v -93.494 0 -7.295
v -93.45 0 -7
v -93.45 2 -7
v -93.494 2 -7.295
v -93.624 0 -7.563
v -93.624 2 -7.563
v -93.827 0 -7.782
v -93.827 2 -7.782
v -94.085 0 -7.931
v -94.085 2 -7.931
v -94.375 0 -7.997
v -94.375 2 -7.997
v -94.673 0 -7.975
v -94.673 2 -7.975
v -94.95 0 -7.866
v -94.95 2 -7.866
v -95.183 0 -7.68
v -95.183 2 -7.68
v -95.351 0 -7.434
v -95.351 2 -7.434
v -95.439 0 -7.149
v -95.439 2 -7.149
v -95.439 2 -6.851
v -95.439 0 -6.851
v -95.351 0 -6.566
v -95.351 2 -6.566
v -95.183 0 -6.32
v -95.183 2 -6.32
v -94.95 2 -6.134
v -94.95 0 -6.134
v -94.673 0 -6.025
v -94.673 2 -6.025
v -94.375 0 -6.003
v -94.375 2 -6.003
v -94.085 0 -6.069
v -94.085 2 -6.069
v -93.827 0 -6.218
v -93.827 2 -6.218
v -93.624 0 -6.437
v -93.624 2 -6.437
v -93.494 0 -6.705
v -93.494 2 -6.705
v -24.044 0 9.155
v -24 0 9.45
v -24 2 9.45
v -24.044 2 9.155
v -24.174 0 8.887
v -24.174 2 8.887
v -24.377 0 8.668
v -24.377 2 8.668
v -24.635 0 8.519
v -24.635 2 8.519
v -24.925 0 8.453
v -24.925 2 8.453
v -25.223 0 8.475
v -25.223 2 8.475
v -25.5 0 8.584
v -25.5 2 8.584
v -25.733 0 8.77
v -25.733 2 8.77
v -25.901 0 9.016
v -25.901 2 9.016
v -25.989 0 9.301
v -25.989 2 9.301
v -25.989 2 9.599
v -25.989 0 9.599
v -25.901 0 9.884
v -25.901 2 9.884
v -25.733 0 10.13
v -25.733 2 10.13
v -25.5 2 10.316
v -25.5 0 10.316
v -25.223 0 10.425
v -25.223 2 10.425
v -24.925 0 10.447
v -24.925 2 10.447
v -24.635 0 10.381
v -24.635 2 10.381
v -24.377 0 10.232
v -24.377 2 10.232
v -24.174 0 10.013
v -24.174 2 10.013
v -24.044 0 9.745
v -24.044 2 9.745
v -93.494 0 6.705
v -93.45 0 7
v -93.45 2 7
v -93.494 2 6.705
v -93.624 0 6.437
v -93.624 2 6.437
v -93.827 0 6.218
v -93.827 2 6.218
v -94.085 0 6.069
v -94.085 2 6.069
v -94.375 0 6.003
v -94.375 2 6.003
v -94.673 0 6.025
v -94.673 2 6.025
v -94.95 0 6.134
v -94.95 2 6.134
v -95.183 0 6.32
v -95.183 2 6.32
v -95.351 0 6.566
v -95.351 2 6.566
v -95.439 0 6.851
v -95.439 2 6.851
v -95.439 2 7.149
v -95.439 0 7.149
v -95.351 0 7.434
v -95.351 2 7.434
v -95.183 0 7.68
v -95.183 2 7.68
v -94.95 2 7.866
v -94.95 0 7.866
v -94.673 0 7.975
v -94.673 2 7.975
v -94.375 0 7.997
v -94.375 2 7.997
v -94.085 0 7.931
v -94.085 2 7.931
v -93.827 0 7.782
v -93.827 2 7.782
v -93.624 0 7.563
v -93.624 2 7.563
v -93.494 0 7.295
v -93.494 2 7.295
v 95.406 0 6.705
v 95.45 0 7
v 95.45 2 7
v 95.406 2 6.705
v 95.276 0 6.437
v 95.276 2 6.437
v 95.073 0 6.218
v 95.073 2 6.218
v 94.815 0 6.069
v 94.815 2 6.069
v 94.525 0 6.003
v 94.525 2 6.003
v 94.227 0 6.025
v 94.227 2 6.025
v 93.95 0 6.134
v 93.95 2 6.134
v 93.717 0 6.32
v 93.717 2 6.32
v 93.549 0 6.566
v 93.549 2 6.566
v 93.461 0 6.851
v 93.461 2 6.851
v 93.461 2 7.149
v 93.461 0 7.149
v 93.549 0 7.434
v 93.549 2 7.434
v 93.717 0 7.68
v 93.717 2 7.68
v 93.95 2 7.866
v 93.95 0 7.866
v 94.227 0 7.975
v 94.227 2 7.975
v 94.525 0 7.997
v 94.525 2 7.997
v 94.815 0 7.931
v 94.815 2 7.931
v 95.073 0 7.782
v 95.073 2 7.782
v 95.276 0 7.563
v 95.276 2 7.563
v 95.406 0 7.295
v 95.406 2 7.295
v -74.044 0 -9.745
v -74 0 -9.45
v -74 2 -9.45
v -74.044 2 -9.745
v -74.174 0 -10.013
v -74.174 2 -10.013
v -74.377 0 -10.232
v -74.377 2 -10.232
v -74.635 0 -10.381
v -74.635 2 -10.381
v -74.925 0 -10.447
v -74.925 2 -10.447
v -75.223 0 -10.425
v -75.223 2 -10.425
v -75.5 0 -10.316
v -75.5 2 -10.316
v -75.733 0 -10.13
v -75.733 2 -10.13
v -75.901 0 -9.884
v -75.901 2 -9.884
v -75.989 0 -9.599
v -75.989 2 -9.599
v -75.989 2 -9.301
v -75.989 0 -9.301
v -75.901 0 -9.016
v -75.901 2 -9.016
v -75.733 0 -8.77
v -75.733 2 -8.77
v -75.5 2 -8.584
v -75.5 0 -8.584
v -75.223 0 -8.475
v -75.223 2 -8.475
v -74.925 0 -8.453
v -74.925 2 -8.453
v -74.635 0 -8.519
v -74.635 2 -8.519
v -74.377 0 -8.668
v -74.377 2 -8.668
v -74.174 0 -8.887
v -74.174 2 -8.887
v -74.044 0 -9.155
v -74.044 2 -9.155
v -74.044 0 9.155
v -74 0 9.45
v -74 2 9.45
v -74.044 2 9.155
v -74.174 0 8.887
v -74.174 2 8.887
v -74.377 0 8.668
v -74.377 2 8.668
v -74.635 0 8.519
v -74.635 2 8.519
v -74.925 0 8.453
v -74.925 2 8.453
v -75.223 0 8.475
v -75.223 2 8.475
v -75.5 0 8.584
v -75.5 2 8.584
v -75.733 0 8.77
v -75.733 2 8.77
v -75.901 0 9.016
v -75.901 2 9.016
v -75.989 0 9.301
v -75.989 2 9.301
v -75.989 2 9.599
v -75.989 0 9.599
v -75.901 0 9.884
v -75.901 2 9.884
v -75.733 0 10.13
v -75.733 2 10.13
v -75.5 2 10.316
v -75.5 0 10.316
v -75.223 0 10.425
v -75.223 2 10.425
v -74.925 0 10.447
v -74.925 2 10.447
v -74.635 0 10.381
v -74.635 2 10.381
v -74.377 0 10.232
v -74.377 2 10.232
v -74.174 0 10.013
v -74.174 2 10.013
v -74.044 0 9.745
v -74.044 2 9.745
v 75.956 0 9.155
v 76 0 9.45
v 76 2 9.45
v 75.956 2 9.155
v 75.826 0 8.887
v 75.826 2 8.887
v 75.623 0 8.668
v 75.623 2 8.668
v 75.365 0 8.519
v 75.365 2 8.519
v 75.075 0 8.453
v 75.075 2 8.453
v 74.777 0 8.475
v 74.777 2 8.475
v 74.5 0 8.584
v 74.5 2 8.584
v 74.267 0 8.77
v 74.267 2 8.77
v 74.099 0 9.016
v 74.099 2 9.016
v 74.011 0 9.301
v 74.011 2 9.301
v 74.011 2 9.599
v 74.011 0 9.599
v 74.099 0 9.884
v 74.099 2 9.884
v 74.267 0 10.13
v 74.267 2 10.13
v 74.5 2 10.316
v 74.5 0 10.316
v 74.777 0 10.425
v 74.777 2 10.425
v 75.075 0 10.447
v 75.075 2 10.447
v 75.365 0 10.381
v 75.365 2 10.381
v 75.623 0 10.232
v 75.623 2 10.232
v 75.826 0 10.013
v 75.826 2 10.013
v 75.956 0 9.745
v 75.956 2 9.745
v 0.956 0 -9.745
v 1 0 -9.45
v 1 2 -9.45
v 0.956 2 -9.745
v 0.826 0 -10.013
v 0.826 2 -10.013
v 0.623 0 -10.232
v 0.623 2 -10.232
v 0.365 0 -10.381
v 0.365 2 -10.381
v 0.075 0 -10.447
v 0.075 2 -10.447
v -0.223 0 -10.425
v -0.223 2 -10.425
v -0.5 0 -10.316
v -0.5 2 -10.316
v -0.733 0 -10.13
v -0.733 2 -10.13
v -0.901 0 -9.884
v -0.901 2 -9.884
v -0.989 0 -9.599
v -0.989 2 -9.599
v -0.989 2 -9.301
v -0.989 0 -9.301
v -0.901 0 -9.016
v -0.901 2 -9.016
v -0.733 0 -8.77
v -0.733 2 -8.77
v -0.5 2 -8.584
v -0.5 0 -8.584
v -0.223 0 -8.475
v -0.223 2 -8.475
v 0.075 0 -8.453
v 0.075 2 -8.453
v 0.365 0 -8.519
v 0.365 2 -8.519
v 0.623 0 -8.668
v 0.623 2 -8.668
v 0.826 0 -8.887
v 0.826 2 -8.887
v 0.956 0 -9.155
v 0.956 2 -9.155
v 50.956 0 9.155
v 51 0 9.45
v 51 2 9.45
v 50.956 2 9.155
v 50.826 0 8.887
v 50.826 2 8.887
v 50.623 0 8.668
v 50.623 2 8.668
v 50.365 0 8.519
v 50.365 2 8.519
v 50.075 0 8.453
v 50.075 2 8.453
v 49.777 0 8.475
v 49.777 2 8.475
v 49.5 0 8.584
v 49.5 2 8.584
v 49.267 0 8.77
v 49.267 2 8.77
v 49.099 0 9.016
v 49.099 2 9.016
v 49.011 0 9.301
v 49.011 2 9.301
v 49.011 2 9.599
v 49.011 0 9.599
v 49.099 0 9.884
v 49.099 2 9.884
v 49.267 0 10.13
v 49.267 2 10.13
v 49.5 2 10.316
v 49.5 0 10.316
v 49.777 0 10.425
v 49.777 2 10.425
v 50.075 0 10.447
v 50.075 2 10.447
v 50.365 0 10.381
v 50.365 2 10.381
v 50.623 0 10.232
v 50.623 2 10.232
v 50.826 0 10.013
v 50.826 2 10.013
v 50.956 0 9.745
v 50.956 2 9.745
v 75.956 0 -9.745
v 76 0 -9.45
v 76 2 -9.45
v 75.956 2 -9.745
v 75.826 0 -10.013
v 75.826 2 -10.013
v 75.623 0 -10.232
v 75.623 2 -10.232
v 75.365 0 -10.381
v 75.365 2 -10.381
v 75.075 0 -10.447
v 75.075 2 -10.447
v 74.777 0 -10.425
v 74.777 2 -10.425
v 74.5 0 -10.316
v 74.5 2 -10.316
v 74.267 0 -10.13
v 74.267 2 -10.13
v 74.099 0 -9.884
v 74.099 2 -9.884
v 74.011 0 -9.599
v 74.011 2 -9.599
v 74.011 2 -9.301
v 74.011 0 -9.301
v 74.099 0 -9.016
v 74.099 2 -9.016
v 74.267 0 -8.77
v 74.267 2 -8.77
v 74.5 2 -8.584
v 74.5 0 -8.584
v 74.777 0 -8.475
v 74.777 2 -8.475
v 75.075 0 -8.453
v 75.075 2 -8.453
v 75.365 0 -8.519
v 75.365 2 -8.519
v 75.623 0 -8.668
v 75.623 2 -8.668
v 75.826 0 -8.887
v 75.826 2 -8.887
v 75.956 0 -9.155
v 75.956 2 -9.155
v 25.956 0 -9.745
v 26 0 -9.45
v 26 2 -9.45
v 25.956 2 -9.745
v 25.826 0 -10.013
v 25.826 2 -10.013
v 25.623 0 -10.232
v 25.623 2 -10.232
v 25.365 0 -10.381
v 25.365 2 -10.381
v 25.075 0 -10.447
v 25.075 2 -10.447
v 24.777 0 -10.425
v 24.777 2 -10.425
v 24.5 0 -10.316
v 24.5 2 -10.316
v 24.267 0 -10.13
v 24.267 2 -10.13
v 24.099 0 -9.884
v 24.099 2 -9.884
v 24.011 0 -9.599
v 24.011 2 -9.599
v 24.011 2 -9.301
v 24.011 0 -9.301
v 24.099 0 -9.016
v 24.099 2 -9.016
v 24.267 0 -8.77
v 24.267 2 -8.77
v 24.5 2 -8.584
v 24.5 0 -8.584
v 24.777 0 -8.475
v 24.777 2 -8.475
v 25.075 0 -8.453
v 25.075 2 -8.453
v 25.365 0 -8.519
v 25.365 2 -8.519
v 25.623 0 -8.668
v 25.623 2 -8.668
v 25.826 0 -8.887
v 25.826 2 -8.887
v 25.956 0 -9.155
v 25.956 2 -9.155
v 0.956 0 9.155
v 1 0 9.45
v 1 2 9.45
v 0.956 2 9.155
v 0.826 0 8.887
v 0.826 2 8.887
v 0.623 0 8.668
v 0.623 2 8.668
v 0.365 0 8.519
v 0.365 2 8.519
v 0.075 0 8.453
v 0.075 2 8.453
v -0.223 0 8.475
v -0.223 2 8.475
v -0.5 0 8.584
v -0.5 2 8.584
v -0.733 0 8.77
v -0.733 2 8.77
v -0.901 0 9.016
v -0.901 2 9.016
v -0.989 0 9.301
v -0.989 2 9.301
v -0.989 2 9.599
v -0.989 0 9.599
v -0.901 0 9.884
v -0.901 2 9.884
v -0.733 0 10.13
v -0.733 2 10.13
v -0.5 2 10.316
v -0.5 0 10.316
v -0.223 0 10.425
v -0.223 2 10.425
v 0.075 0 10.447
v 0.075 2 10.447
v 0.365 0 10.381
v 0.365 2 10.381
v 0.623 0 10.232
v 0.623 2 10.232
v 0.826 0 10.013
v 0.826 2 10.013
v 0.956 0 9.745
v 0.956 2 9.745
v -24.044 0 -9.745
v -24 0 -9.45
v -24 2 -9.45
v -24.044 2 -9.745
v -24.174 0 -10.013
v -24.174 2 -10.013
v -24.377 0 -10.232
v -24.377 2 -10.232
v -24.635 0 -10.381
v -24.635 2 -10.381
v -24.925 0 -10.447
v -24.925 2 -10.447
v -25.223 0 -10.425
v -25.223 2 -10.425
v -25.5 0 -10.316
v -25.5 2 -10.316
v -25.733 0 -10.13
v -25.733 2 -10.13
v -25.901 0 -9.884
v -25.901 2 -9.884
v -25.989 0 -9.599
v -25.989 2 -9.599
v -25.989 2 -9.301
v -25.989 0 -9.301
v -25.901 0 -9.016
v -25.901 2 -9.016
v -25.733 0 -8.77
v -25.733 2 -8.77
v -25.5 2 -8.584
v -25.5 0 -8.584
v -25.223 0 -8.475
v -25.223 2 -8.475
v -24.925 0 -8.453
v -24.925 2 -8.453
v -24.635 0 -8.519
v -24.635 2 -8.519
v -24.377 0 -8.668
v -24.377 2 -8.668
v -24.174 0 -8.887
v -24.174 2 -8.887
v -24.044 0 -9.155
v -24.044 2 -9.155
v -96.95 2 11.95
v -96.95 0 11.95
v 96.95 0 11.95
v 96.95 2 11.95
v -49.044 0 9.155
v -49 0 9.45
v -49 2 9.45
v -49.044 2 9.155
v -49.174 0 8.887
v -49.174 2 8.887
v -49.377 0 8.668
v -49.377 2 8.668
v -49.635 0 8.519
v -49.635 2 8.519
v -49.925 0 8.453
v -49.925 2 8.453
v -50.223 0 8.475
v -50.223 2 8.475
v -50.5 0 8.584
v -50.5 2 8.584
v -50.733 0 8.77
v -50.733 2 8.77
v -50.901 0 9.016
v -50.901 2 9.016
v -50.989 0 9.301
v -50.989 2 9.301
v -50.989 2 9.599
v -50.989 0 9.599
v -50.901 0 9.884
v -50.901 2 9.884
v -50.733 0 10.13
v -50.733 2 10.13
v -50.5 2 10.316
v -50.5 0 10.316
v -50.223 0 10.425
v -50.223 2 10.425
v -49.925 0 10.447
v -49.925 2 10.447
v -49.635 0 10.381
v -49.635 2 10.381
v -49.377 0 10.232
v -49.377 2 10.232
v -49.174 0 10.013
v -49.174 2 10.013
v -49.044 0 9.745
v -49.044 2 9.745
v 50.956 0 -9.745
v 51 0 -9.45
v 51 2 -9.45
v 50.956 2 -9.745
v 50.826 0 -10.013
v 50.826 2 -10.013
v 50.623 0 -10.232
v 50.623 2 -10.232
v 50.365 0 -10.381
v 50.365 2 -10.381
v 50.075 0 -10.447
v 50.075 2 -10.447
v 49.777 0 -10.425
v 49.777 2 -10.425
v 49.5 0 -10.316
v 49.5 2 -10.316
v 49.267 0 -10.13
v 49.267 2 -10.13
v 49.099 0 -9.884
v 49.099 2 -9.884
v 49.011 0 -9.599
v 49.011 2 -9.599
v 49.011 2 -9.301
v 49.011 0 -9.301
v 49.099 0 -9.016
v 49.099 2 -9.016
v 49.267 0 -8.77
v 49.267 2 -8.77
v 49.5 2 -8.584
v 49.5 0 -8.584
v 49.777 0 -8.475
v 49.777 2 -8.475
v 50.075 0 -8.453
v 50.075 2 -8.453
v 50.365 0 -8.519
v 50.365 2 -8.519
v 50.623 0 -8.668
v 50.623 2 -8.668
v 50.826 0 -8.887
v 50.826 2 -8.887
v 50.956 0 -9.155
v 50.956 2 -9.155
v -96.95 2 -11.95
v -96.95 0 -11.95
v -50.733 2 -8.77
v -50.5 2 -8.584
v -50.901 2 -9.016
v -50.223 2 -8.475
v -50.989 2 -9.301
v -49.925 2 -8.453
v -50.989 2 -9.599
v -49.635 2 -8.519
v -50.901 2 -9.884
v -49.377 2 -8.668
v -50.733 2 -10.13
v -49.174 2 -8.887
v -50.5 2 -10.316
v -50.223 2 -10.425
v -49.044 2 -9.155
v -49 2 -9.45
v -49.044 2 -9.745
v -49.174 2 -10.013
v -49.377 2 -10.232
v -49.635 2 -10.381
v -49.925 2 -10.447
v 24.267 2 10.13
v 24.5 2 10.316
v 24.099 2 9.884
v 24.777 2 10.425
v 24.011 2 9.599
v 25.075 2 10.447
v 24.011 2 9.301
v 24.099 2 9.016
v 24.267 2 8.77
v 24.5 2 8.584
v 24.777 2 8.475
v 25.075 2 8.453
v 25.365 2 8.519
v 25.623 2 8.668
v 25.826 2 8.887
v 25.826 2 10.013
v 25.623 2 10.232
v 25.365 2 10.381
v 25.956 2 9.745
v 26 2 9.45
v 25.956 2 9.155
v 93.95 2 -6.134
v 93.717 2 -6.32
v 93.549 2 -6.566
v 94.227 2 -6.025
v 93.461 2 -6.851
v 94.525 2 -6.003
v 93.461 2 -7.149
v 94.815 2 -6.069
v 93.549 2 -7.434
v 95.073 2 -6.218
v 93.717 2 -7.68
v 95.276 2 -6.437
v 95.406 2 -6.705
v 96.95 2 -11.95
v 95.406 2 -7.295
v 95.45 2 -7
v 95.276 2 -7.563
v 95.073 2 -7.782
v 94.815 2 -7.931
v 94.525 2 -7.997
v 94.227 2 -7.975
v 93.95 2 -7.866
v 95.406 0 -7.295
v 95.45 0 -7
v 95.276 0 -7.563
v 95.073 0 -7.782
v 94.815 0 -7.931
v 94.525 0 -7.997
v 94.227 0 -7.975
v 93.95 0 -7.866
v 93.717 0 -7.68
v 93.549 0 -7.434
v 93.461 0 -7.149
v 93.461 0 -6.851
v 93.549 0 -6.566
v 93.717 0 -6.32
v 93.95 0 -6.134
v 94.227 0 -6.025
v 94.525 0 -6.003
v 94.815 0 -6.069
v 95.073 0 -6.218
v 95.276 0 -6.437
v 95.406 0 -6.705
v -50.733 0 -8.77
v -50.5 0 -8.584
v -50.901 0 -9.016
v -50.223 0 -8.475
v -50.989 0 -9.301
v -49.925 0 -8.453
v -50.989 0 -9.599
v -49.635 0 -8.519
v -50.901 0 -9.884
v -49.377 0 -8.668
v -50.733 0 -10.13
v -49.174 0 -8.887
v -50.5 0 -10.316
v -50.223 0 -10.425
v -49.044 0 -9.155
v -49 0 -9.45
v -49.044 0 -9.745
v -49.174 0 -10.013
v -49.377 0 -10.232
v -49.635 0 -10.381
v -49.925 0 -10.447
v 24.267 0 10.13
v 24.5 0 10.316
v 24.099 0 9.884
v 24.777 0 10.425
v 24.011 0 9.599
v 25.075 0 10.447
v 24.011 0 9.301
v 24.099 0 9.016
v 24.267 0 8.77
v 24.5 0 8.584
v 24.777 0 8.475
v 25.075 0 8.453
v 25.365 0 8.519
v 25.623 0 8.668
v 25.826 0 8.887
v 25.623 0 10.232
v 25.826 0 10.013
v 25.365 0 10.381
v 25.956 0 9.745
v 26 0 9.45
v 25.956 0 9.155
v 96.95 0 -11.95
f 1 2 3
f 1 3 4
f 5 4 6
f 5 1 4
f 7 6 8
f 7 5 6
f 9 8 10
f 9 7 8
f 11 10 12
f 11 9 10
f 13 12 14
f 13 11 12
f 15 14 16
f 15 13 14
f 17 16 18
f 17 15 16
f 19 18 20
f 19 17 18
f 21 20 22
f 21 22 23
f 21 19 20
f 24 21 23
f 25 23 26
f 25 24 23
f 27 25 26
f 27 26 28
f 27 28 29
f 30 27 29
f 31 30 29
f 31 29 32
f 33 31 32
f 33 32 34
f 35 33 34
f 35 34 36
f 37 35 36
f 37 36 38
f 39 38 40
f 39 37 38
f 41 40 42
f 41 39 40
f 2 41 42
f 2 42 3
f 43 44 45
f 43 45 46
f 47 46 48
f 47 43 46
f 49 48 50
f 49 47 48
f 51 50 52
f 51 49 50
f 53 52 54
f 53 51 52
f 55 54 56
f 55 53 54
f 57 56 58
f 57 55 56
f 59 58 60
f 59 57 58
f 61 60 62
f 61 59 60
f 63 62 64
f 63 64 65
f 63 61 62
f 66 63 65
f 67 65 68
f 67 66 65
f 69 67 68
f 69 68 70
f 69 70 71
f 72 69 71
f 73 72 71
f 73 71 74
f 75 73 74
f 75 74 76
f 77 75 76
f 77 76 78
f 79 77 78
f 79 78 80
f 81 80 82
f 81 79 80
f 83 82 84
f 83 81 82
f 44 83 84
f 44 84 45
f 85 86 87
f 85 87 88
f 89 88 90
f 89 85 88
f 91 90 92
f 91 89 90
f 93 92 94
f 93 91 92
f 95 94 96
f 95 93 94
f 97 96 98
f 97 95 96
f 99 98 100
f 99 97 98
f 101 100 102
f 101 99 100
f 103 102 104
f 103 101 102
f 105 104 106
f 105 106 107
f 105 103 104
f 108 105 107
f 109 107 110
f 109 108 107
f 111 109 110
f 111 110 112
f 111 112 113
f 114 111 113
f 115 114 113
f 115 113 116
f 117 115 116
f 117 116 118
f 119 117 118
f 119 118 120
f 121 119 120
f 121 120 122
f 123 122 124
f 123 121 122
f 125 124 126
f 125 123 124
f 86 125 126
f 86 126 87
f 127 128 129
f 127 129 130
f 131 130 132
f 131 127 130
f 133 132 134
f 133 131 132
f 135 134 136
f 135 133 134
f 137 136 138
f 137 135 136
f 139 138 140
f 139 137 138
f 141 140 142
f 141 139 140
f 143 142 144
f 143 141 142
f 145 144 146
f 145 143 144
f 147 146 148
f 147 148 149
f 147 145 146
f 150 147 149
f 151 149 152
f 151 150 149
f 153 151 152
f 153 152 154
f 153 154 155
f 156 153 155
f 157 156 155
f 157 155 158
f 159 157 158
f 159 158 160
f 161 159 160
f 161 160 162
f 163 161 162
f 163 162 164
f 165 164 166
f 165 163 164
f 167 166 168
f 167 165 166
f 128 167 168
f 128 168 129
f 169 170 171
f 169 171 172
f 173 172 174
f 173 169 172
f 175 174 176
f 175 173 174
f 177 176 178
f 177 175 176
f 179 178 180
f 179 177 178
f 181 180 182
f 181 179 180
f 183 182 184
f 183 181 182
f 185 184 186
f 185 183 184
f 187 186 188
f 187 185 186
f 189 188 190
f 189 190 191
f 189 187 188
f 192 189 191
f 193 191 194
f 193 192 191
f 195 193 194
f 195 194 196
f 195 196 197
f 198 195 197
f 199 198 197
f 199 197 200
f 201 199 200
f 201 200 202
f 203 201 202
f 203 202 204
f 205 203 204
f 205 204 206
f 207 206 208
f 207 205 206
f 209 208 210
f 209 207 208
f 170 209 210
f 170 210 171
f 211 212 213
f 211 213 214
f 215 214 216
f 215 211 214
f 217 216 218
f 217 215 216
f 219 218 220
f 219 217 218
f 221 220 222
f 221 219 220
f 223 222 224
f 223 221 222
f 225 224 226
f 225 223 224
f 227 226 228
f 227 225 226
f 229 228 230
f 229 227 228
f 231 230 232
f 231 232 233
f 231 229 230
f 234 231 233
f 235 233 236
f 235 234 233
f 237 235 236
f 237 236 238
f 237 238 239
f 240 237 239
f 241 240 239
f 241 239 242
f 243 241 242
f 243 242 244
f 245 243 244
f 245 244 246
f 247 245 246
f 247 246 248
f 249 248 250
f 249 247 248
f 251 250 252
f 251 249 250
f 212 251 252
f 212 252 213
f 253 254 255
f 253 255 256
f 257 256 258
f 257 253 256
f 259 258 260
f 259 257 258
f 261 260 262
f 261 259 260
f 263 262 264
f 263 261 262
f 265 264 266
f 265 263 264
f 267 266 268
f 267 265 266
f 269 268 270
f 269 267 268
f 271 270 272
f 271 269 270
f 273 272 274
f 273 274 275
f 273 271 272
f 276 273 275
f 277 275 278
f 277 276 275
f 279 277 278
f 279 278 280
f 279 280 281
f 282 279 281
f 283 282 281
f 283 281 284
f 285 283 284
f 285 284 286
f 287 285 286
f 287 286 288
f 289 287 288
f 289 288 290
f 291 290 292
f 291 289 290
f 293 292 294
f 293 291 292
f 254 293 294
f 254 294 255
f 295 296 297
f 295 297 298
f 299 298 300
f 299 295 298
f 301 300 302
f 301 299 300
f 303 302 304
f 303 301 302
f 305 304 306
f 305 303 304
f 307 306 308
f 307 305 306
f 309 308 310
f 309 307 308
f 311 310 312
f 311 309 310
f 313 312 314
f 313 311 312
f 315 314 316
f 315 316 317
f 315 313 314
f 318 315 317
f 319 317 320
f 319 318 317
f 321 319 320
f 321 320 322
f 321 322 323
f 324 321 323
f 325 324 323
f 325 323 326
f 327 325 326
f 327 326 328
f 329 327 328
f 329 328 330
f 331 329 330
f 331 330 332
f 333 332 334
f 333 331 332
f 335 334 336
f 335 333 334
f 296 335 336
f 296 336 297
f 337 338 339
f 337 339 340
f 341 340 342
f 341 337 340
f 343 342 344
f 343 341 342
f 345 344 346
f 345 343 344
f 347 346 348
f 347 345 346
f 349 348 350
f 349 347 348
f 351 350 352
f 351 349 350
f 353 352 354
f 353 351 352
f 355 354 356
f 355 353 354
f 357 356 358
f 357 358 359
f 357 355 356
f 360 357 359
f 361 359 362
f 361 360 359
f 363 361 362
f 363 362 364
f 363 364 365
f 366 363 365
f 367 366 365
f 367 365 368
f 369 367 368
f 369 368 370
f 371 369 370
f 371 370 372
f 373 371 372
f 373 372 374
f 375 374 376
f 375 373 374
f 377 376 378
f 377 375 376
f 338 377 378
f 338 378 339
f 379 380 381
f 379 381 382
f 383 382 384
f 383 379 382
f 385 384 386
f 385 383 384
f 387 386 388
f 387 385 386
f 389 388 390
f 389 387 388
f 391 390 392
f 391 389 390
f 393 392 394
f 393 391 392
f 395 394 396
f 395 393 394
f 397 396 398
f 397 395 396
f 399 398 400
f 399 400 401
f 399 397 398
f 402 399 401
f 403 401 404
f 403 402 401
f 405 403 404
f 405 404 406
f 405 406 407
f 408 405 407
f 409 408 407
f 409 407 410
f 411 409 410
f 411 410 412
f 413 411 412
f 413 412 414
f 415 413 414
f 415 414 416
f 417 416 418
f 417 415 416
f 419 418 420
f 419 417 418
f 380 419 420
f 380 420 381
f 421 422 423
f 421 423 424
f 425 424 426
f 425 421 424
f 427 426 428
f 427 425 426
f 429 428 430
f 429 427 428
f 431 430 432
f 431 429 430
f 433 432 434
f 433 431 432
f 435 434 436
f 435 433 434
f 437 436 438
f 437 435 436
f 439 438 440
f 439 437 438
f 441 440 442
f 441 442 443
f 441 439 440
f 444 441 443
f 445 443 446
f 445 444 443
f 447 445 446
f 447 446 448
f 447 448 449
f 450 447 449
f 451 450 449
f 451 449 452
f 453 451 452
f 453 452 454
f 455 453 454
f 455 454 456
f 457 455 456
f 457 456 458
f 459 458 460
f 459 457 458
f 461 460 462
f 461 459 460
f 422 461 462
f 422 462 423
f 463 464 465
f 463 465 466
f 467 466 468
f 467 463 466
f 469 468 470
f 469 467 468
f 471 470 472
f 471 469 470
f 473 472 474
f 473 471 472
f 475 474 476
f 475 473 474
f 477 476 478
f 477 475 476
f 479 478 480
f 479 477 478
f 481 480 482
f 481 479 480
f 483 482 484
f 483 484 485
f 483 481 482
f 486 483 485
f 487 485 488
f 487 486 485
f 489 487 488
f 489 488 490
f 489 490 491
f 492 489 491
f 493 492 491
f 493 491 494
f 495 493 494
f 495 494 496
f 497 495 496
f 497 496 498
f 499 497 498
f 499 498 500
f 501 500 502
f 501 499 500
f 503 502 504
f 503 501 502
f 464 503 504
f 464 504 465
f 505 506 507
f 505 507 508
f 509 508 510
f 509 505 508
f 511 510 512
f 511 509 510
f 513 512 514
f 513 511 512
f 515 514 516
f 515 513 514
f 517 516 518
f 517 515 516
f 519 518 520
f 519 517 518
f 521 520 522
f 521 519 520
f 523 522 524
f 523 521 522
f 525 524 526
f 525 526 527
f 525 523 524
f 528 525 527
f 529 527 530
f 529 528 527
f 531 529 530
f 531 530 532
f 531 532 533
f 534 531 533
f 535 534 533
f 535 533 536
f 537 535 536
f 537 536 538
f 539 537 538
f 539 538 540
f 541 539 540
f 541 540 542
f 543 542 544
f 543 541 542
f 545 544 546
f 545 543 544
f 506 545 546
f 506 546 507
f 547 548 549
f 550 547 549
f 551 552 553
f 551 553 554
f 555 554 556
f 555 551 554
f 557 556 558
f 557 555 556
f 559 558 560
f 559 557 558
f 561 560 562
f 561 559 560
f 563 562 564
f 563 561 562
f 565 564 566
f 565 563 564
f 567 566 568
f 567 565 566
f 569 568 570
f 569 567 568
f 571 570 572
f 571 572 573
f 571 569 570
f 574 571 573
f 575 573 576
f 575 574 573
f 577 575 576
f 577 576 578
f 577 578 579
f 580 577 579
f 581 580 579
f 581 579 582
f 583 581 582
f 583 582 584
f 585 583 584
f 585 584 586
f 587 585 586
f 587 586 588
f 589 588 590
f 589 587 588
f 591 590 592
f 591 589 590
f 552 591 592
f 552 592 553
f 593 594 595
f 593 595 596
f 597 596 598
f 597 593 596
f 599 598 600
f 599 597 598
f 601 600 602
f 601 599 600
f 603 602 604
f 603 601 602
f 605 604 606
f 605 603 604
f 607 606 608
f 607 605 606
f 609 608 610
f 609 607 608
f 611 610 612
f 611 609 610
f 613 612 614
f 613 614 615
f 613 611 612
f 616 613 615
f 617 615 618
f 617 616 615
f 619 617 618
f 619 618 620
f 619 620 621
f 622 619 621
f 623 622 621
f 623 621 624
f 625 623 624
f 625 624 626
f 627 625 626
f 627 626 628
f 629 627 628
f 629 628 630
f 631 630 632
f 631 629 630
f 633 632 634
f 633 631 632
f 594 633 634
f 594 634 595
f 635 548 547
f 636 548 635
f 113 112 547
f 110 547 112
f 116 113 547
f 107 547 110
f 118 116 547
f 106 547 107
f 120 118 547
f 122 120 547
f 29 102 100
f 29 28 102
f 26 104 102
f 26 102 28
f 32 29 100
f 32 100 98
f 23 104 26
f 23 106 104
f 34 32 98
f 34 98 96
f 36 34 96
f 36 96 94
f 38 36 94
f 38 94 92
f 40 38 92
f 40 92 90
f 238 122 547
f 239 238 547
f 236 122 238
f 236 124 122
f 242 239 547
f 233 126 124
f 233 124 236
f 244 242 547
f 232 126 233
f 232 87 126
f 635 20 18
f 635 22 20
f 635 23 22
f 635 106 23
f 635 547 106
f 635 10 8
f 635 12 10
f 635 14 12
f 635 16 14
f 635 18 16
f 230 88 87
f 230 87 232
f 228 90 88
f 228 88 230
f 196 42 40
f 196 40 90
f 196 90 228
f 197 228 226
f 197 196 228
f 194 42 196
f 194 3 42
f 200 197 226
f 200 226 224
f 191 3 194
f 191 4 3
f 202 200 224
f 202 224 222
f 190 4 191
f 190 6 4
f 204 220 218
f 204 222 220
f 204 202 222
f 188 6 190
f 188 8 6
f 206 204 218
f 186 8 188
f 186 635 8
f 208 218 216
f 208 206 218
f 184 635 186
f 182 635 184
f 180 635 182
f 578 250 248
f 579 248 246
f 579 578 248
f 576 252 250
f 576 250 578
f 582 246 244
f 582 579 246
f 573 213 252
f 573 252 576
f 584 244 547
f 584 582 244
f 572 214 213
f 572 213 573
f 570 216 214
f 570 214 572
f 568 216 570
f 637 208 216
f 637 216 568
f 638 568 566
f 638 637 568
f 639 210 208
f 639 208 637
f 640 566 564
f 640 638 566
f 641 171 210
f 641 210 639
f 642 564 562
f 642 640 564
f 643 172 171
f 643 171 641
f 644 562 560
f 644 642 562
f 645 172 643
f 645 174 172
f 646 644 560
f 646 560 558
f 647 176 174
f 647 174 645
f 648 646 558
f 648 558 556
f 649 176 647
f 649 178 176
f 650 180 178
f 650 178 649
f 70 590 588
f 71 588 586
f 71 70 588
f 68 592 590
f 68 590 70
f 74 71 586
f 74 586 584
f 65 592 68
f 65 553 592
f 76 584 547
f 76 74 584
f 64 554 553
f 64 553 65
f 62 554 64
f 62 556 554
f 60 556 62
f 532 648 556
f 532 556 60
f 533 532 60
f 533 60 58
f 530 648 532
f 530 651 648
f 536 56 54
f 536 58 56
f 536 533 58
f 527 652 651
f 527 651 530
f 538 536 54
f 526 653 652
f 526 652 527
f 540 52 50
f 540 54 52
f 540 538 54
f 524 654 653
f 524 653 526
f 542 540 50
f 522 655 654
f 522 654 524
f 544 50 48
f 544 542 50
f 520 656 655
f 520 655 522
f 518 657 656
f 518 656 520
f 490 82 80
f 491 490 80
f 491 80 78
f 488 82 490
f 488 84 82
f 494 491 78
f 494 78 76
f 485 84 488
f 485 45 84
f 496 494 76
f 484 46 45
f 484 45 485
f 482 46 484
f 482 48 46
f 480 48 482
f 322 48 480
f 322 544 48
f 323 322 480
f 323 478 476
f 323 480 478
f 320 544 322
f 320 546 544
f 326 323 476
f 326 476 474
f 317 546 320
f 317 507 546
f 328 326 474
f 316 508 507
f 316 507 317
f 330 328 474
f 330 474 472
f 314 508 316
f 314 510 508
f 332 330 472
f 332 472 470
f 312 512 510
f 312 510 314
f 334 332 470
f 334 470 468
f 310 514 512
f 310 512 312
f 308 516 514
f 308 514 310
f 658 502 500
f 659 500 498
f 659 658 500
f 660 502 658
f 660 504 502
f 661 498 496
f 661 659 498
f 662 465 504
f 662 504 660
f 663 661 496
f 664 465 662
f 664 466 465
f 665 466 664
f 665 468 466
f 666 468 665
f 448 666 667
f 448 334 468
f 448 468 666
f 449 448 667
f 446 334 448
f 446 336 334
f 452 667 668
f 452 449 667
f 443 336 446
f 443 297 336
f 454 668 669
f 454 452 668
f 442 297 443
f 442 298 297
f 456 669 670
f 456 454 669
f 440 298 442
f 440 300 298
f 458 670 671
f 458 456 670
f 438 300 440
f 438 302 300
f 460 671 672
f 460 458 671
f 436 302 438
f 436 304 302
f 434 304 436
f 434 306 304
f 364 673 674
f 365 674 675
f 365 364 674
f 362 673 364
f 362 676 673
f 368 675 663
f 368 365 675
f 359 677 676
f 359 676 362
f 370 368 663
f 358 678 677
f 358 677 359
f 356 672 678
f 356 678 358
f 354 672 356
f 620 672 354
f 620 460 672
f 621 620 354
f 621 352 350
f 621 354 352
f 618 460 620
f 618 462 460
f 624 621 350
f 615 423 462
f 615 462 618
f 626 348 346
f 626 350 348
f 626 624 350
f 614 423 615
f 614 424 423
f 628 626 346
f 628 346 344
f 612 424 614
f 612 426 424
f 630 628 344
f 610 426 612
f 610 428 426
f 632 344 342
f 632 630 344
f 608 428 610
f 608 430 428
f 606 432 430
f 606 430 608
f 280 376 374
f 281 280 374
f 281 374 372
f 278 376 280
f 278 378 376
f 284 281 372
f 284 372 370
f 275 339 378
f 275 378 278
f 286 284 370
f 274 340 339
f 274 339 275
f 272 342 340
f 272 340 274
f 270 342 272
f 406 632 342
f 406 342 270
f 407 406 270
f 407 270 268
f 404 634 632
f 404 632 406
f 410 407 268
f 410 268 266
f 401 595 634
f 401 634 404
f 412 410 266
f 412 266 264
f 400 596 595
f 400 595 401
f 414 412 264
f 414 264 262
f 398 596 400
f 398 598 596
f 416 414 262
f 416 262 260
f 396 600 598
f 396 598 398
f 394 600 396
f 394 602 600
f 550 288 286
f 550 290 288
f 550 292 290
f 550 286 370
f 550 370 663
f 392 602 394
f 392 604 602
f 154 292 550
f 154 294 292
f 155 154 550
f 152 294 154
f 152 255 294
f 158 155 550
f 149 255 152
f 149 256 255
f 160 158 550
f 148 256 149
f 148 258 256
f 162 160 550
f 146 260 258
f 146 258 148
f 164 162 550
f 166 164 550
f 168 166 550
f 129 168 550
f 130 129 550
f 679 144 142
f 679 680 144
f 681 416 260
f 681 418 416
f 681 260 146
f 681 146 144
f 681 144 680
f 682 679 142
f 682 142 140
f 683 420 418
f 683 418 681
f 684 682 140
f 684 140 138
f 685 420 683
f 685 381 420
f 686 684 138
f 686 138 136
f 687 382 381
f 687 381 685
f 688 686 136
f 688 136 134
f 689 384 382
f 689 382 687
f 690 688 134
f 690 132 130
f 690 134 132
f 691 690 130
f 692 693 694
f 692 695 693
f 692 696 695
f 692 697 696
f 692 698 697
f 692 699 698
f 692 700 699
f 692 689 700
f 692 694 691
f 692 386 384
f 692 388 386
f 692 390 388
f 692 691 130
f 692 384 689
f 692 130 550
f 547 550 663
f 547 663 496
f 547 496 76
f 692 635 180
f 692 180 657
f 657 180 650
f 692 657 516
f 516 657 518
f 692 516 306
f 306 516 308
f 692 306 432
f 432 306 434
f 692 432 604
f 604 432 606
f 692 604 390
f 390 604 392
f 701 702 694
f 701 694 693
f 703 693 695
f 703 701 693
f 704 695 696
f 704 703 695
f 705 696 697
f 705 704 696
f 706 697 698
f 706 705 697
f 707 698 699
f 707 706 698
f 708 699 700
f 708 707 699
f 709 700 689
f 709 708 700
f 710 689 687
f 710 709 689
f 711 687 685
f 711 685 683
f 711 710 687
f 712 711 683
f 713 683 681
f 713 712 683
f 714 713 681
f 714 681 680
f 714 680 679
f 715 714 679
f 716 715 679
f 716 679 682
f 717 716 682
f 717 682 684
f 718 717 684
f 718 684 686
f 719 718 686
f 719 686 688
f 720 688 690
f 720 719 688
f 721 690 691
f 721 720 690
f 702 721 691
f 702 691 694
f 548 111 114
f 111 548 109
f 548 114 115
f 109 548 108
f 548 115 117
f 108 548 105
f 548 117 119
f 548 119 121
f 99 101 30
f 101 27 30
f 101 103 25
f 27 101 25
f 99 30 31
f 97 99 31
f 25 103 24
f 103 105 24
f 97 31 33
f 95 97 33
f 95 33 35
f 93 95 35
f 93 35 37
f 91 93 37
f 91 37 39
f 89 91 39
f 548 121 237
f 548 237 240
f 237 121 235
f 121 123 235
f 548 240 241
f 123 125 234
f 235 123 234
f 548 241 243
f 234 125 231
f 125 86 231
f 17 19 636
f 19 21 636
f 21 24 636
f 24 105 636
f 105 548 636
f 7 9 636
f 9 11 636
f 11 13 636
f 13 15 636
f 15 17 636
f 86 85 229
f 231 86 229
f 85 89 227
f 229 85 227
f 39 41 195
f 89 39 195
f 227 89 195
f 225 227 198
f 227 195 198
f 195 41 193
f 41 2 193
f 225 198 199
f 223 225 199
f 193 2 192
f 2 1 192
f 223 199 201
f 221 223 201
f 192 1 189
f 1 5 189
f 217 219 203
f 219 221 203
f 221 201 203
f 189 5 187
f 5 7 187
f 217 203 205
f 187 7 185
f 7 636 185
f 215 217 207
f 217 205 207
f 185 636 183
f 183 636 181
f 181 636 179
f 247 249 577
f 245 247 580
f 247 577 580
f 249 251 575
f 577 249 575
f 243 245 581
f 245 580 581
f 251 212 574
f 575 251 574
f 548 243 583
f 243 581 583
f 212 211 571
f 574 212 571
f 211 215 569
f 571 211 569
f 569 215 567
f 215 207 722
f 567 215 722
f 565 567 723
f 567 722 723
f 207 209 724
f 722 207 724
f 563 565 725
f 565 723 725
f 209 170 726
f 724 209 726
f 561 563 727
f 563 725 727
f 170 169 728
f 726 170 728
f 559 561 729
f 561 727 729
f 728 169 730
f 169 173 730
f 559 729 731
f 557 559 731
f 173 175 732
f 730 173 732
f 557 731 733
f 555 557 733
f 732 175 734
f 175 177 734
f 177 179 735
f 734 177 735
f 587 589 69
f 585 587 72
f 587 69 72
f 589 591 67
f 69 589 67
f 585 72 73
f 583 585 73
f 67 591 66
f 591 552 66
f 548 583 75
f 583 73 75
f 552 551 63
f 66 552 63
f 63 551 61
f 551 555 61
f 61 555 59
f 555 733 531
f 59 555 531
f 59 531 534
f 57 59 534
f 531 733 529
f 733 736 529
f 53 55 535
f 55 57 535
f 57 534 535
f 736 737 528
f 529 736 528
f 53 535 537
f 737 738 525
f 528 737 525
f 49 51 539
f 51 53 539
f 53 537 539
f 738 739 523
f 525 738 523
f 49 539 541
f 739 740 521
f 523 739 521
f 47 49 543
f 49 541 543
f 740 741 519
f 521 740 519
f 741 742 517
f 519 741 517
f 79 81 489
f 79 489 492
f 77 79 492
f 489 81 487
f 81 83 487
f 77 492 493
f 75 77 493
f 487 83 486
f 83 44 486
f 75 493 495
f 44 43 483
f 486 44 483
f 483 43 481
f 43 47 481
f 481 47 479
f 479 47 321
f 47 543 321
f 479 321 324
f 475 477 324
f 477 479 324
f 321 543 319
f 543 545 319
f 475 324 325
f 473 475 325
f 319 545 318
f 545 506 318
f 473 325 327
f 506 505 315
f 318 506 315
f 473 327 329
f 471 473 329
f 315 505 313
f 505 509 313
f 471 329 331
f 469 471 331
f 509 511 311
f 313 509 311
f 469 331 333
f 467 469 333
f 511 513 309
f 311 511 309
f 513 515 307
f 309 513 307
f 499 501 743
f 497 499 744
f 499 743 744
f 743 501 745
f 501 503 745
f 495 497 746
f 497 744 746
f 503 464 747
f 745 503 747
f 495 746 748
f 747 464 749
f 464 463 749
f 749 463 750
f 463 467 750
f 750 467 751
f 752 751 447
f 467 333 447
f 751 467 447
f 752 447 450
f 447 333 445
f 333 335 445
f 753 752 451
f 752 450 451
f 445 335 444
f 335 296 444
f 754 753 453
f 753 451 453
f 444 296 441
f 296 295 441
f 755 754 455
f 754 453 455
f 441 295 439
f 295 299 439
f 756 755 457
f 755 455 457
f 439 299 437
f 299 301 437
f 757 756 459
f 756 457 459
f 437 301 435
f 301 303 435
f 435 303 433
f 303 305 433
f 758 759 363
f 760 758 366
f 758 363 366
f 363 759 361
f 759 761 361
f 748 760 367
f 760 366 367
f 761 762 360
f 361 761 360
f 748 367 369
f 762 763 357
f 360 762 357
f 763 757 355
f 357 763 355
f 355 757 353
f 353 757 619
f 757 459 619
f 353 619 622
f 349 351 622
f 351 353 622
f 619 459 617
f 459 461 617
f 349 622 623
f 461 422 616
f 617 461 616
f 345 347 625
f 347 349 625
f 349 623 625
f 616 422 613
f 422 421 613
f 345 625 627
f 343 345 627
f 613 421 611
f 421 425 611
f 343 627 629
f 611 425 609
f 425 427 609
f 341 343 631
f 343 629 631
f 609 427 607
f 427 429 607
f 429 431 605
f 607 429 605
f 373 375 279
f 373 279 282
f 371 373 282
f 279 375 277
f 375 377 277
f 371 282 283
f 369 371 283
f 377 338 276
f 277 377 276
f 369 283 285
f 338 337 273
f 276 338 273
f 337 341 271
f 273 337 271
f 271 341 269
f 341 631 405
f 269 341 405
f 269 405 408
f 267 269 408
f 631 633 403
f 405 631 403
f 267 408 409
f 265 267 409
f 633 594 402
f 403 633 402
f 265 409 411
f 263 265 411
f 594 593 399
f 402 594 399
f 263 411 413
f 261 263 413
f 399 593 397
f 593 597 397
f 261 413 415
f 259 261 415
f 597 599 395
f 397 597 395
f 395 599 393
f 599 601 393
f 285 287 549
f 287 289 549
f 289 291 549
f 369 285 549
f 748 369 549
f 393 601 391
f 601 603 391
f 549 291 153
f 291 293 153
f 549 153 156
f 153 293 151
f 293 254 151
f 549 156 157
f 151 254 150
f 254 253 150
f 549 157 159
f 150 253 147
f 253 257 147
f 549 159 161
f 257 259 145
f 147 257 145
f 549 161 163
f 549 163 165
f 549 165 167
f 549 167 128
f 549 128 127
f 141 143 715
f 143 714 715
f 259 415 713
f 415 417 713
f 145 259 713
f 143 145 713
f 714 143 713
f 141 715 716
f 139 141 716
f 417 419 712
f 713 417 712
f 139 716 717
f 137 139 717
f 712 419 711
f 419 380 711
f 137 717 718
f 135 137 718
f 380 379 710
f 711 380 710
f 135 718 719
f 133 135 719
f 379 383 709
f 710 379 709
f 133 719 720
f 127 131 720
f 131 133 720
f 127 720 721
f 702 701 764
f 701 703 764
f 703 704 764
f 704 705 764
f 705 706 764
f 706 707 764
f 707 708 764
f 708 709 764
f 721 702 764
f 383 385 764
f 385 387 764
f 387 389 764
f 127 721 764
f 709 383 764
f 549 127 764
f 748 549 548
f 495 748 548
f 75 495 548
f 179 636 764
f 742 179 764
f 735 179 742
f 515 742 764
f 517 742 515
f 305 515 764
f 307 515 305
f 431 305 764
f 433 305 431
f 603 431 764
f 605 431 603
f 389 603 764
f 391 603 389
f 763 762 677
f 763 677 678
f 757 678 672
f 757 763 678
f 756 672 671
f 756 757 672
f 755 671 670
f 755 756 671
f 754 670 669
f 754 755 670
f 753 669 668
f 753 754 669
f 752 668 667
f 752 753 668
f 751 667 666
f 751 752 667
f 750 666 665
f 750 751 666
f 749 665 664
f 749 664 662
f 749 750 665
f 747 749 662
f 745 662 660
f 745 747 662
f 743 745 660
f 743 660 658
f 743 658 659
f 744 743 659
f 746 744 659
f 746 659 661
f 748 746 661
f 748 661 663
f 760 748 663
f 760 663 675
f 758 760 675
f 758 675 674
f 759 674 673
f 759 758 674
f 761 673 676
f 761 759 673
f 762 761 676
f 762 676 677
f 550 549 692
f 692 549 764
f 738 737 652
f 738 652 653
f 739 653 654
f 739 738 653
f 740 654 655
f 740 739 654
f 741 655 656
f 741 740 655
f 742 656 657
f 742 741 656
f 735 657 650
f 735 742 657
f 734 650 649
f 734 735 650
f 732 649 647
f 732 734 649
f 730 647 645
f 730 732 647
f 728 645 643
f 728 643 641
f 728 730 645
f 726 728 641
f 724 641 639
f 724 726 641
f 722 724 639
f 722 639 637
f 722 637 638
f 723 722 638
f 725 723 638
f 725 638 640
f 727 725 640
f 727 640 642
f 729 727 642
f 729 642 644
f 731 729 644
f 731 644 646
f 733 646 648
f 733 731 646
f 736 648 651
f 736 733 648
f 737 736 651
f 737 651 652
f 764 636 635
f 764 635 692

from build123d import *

# Parameters (mm, degrees)
SKETCH1_W           = 193.9
SKETCH1_H           = 23.9
SKETCH1_R           = 1
BOSS_EXTRUDE1_DEPTH = 2


with BuildPart() as part:
    # Sketch1 → Boss-Extrude1 (new body)
    with BuildSketch(Plane(origin=(0, 0, 0), x_dir=(1, 0, 0), z_dir=(0, 1, 0))):
        Rectangle(SKETCH1_W, SKETCH1_H)
        with Locations((-25, 9.45)):
            Circle(SKETCH1_R, mode=Mode.SUBTRACT)
        with Locations((0, 9.45)):
            Circle(SKETCH1_R, mode=Mode.SUBTRACT)
        with Locations((25, 9.45)):
            Circle(SKETCH1_R, mode=Mode.SUBTRACT)
        with Locations((-94.45, 7)):
            Circle(SKETCH1_R, mode=Mode.SUBTRACT)
        with Locations((25, -9.45)):
            Circle(SKETCH1_R, mode=Mode.SUBTRACT)
        with Locations((0, -9.45)):
            Circle(SKETCH1_R, mode=Mode.SUBTRACT)
        with Locations((-25, -9.45)):
            Circle(SKETCH1_R, mode=Mode.SUBTRACT)
        with Locations((-94.45, -7)):
            Circle(SKETCH1_R, mode=Mode.SUBTRACT)
        with Locations((94.45, -7)):
            Circle(SKETCH1_R, mode=Mode.SUBTRACT)
        with Locations((94.45, 7)):
            Circle(SKETCH1_R, mode=Mode.SUBTRACT)
        with Locations((-50, 9.45)):
            Circle(SKETCH1_R, mode=Mode.SUBTRACT)
        with Locations((-75, 9.45)):
            Circle(SKETCH1_R, mode=Mode.SUBTRACT)
        with Locations((75, 9.45)):
            Circle(SKETCH1_R, mode=Mode.SUBTRACT)
        with Locations((50, 9.45)):
            Circle(SKETCH1_R, mode=Mode.SUBTRACT)
        with Locations((75, -9.45)):
            Circle(SKETCH1_R, mode=Mode.SUBTRACT)
        with Locations((50, -9.45)):
            Circle(SKETCH1_R, mode=Mode.SUBTRACT)
        with Locations((-50, -9.45)):
            Circle(SKETCH1_R, mode=Mode.SUBTRACT)
        with Locations((-75, -9.45)):
            Circle(SKETCH1_R, mode=Mode.SUBTRACT)
    extrude(amount=BOSS_EXTRUDE1_DEPTH)


solid = part.part
